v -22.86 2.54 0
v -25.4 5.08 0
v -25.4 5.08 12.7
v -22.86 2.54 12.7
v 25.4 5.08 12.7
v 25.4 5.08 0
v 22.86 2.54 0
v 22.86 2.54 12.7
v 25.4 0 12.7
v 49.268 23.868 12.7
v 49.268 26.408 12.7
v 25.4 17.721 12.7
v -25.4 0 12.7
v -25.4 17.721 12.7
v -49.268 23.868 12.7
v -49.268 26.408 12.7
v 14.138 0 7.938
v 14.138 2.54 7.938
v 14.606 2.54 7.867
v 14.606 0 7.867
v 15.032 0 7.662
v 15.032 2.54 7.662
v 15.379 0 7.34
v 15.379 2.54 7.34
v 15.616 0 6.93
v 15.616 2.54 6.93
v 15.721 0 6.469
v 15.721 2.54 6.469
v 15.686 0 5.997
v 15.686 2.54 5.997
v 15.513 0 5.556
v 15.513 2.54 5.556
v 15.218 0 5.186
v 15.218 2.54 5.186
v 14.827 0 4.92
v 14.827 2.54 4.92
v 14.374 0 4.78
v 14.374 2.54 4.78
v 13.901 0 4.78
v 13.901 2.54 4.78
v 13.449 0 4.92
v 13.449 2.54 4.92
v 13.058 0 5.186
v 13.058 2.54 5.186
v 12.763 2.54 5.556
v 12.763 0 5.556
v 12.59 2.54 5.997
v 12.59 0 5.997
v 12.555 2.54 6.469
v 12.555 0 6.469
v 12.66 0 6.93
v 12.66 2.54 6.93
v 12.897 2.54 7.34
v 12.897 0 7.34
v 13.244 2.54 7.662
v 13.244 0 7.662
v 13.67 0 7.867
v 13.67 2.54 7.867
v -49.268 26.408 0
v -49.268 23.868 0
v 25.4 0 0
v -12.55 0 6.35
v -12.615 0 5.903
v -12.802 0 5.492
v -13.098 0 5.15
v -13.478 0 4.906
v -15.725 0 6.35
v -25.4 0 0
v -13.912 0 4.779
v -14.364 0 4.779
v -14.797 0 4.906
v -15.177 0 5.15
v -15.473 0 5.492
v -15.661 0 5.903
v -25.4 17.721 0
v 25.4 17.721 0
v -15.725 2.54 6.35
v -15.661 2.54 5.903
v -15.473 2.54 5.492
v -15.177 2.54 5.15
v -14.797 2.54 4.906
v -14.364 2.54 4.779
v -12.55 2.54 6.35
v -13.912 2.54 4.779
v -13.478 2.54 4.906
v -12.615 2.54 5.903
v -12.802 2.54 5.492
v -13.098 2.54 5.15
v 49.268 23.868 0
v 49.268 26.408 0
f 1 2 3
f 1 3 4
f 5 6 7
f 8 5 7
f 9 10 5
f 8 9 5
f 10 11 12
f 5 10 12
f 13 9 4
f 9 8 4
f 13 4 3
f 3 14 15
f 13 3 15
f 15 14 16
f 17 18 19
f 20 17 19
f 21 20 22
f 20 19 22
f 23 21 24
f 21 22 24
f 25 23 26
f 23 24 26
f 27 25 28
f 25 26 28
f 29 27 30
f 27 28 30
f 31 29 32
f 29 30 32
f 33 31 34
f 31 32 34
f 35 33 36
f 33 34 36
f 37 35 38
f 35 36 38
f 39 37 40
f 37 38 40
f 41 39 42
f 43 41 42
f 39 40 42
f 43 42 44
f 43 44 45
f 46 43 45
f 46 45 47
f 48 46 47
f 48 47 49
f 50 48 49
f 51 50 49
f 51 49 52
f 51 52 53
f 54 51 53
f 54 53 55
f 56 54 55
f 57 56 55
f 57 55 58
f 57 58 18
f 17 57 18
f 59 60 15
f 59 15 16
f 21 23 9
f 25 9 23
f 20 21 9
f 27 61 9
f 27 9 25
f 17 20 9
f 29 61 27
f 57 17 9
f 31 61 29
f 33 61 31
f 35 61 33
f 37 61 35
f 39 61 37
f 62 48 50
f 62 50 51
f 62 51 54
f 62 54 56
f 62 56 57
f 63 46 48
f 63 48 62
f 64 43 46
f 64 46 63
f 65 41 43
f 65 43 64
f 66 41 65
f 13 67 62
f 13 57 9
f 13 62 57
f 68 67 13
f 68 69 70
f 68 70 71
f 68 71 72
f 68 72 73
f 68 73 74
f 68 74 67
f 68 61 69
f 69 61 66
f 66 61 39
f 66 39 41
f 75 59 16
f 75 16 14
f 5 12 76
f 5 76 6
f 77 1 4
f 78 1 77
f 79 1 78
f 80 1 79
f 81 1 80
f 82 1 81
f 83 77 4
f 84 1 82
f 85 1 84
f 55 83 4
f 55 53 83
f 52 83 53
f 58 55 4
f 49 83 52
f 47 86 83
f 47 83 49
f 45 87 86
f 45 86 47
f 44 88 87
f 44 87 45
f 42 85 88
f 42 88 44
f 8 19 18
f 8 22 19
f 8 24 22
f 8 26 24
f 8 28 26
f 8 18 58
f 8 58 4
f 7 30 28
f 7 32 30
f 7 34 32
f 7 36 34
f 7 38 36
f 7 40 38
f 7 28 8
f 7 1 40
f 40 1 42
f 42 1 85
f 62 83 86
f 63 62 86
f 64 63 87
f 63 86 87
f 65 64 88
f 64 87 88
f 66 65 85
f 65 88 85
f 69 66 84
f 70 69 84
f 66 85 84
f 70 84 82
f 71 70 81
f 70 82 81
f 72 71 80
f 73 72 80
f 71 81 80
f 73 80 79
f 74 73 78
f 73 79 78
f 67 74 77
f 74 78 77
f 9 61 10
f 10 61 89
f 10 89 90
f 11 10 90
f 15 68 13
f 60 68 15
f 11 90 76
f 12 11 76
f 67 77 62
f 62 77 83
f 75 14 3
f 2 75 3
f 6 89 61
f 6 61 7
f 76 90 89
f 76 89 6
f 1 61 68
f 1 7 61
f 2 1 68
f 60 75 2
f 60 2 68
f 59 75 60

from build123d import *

# Parameters (mm, degrees)
BOSS_EXTRUDE1_DEPTH = 12.7
CUT_EXTRUDE1_REACH  = 58.199
SKETCH2_R           = 1.5875


with BuildPart() as part:
    # Sketch1 → Boss-Extrude1 (new body)
    with BuildSketch(Plane.XY):
        Polygon((25.4, 0), (49.268192568, 23.868192568), (49.268192568, 26.408192568), (25.4, 17.720880927), (25.4, 5.08), (22.86, 2.54), (0, 2.54), (0, 0), align=None)
    boss_extrude1 = extrude(amount=BOSS_EXTRUDE1_DEPTH)

    # Mirror1: Boss-Extrude1 across plane
    add(boss_extrude1.mirror(Plane(origin=(0, 0, 12.7), x_dir=(0, 0, 1), z_dir=(1, 0, 0))))

    # Sketch2 → Cut-Extrude1 (cut, up to next)
    with BuildSketch(Plane(origin=(0, 2.54, 0), x_dir=(1, 0, 0), z_dir=(0, 1, 0)), mode=Mode.PRIVATE) as cut_extrude1_sk1:
        with BuildLine():
            ThreePointArc((-12.550350762, -6.35), (-14.137850762, -4.7625), (-15.725350762, -6.35))
            Line((-15.725350762, -6.35), (-12.550350762, -6.35))
        make_face()
    cut_extrude1_tool1 = extrude(cut_extrude1_sk1.sketch, amount=-CUT_EXTRUDE1_REACH, mode=Mode.PRIVATE) & part.part
    # Sketch2 → Cut-Extrude1 (cut, up to next)
    with BuildSketch(Plane(origin=(0, 2.54, 0), x_dir=(1, 0, 0), z_dir=(0, 1, 0)), mode=Mode.PRIVATE) as cut_extrude1_sk2:
        with Locations(Location((14.137850762, -6.35, 0), (0, 0, 270))):
            Circle(SKETCH2_R)
    cut_extrude1_tool2 = extrude(cut_extrude1_sk2.sketch, amount=-CUT_EXTRUDE1_REACH, mode=Mode.PRIVATE) & part.part
    add(cut_extrude1_tool1.solids().sort_by_distance((-14.137851, 2.54, 5.676244))[0], mode=Mode.SUBTRACT)
    add(cut_extrude1_tool2.solids().sort_by_distance((14.137851, 2.54, 6.35))[0], mode=Mode.SUBTRACT)


solid = part.part
